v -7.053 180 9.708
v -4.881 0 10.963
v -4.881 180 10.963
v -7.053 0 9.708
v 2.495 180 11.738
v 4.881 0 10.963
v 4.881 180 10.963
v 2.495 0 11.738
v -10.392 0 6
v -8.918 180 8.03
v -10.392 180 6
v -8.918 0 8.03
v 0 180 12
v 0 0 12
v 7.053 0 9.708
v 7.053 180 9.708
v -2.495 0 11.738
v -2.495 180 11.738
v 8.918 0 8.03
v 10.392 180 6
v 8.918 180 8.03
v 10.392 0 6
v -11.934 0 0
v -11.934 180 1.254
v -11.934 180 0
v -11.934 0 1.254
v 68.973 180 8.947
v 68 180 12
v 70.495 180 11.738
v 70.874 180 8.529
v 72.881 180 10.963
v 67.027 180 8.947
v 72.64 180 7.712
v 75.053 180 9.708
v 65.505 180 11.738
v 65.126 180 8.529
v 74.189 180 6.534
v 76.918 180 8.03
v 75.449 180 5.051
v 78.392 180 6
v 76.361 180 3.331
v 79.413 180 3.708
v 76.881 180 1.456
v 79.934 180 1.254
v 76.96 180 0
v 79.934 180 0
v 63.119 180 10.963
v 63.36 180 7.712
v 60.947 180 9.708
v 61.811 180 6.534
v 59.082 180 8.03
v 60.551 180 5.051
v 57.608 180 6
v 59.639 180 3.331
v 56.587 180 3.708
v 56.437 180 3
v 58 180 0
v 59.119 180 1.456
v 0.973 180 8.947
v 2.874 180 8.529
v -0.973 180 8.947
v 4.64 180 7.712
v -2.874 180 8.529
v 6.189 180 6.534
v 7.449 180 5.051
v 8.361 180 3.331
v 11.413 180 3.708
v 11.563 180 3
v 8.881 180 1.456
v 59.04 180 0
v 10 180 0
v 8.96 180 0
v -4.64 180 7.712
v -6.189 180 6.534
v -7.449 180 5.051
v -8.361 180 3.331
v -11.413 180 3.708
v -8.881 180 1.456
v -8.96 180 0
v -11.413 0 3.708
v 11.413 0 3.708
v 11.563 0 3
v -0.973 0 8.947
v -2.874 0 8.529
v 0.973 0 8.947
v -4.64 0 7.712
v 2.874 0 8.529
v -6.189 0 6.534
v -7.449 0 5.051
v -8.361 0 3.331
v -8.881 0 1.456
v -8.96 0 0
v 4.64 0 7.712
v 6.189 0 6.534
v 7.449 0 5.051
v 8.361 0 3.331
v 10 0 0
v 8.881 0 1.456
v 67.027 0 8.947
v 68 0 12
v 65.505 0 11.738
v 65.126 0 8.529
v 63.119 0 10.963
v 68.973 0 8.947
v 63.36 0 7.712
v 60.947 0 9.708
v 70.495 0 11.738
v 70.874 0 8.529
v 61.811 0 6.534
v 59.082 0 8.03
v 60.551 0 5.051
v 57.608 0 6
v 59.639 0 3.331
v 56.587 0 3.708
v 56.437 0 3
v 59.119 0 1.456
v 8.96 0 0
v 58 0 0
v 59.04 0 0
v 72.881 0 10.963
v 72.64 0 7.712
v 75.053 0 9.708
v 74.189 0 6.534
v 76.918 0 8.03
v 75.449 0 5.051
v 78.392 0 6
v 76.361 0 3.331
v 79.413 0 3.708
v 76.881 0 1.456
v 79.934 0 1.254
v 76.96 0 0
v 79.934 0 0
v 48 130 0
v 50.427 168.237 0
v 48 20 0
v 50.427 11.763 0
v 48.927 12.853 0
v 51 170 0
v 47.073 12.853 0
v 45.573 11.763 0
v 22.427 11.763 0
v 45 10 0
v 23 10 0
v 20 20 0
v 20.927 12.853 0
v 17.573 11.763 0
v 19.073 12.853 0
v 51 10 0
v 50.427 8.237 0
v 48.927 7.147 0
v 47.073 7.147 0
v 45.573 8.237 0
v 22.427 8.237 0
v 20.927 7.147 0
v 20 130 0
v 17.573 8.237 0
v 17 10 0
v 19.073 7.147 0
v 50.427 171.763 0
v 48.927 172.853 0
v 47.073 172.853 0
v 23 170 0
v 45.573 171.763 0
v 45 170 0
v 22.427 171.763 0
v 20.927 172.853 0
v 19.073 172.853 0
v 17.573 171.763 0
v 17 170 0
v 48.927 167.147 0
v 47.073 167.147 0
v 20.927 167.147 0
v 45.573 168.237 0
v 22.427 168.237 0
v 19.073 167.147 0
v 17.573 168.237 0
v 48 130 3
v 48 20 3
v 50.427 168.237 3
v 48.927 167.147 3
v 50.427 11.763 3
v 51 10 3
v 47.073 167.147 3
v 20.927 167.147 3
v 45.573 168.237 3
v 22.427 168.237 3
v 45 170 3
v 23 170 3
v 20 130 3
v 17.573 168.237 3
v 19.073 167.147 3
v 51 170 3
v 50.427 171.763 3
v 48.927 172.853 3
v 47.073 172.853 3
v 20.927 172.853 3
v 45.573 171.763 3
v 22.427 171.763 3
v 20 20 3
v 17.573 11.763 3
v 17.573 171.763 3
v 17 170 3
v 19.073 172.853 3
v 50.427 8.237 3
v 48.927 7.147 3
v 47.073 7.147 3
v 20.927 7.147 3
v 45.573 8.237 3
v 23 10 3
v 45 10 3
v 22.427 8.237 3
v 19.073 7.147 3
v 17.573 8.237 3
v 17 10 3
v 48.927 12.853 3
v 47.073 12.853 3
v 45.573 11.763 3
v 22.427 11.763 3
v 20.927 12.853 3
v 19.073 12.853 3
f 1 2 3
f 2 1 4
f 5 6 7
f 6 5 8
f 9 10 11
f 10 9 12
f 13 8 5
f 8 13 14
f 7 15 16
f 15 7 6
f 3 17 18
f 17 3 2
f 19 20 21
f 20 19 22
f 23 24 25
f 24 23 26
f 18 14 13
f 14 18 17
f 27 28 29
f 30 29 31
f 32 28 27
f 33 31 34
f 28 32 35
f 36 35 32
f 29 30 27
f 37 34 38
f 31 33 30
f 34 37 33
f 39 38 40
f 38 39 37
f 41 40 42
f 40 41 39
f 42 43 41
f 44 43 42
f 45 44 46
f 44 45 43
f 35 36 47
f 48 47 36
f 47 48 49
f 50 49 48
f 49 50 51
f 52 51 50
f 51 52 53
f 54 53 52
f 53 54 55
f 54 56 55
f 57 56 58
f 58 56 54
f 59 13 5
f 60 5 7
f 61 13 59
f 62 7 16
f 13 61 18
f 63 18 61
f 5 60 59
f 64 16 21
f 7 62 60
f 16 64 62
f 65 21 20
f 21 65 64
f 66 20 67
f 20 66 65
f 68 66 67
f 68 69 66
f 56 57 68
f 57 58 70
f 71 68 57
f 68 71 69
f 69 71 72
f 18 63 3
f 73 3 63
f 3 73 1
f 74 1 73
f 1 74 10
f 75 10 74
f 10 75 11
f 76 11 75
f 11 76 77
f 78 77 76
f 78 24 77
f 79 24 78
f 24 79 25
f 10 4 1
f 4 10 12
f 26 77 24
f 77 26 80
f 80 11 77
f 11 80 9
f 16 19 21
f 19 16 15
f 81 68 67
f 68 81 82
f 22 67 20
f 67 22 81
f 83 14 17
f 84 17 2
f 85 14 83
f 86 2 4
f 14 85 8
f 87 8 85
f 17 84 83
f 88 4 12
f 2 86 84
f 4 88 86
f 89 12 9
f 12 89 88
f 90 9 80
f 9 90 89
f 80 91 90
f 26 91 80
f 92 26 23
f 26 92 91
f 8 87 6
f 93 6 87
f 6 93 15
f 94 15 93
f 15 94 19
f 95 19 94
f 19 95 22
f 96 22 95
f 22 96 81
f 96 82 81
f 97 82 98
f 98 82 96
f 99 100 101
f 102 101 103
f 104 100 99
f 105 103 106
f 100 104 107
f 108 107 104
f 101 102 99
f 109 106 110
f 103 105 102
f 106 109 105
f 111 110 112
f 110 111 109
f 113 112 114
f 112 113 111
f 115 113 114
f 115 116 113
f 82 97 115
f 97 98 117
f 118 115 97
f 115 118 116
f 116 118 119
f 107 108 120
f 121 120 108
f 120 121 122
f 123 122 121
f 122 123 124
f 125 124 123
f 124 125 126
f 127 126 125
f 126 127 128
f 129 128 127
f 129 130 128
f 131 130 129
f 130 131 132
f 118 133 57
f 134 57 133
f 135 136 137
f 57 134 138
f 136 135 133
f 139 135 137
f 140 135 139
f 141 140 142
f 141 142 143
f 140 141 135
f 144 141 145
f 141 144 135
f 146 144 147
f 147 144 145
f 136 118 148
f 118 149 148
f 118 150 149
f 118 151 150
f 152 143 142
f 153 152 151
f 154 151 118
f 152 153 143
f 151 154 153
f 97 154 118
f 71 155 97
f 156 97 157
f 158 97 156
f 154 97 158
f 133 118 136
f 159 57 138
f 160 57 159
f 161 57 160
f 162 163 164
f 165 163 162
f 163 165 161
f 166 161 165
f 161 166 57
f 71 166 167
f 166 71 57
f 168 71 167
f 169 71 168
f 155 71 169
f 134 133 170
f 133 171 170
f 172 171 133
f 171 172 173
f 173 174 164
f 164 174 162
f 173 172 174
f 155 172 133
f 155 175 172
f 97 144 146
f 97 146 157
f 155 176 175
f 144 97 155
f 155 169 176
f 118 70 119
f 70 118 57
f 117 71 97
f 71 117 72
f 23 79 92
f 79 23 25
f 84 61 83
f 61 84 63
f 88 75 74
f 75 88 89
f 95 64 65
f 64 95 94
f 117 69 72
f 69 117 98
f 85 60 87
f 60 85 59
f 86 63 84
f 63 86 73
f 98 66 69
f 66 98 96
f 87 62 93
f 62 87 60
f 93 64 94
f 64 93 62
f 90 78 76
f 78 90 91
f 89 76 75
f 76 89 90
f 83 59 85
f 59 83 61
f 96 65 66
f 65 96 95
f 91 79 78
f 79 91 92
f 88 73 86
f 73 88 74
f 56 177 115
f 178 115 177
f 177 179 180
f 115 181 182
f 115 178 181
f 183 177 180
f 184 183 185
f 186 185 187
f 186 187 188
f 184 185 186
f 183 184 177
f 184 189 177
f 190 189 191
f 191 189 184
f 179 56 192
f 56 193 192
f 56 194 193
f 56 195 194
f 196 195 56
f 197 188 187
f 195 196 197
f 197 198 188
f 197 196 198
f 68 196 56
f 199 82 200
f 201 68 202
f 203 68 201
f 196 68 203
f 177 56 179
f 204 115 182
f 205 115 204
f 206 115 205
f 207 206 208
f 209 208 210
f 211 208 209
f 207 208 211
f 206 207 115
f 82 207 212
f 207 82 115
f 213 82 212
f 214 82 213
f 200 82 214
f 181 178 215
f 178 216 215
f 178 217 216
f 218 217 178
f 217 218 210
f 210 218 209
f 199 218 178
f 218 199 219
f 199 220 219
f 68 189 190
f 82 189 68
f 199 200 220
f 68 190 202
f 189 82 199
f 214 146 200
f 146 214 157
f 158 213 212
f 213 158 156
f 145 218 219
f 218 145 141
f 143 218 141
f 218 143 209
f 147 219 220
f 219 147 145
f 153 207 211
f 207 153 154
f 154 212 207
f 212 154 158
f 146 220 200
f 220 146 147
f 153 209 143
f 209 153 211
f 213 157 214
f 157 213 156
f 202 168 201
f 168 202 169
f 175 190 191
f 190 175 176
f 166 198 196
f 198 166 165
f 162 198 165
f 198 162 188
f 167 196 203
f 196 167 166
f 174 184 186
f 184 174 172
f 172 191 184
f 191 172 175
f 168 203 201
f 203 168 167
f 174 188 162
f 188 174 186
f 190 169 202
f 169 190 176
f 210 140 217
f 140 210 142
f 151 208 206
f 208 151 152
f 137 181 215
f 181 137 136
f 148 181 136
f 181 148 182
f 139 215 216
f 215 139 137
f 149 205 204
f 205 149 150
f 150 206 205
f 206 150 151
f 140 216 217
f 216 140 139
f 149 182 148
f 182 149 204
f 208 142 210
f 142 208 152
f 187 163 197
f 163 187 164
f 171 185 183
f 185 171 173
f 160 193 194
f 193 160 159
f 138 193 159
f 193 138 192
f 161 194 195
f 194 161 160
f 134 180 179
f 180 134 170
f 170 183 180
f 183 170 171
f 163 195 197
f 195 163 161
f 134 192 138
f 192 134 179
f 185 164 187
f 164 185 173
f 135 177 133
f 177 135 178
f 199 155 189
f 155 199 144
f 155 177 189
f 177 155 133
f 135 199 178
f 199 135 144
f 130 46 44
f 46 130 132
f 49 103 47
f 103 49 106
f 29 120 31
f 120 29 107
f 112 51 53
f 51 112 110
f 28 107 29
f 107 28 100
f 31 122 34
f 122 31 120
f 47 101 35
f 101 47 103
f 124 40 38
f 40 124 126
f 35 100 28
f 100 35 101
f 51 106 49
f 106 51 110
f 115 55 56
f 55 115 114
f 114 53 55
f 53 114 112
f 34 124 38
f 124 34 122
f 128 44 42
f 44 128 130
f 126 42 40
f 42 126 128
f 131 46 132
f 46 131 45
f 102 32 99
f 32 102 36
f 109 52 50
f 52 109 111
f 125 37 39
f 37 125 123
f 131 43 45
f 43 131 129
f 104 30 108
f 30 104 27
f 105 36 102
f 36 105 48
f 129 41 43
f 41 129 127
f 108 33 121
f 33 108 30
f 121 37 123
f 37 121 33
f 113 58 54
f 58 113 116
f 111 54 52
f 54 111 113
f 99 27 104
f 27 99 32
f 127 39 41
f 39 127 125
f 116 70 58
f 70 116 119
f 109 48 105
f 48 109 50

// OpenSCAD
halfpipe(180,12,9);
union(){
difference(){
translate([10,0,0])cube([48,180,3]);
translate([20,10,-1])cylinder(h=5,r=3);
translate([20,170,-1])cylinder(h=5,r=3);
translate([48,10,-1])cylinder(h=5,r=3);
translate([48,170,-1])cylinder(h=5,r=3);   
translate([20,20,0])  cube([28,110,3]);
}
//translate([24,138,2])kasten(22,18,30);

}
translate([68,0,0])halfpipe(180,12,9);
module halfpipe(lang,radius1,radius2){
difference(){
    rotate([0,90,90])cylinder(h=lang,r=radius1);
    translate([-radius1,0,-12])cube([radius1*2,lang,radius1]);
    rotate([0,90,90])cylinder(h=lang,r=radius2);
}
}

module kasten(breite1,breite2,hoehe){
difference(){
cube([breite1,breite1,hoehe]);
translate([(breite1-breite2)/2,(breite1-breite2)/2,breite1-breite2])cube([breite2,breite2,hoehe]); 
translate([breite1/2,-1,hoehe/2])rotate([0,90,90])cylinder(h=breite1+2,r=4);     
}  
    
    
}
